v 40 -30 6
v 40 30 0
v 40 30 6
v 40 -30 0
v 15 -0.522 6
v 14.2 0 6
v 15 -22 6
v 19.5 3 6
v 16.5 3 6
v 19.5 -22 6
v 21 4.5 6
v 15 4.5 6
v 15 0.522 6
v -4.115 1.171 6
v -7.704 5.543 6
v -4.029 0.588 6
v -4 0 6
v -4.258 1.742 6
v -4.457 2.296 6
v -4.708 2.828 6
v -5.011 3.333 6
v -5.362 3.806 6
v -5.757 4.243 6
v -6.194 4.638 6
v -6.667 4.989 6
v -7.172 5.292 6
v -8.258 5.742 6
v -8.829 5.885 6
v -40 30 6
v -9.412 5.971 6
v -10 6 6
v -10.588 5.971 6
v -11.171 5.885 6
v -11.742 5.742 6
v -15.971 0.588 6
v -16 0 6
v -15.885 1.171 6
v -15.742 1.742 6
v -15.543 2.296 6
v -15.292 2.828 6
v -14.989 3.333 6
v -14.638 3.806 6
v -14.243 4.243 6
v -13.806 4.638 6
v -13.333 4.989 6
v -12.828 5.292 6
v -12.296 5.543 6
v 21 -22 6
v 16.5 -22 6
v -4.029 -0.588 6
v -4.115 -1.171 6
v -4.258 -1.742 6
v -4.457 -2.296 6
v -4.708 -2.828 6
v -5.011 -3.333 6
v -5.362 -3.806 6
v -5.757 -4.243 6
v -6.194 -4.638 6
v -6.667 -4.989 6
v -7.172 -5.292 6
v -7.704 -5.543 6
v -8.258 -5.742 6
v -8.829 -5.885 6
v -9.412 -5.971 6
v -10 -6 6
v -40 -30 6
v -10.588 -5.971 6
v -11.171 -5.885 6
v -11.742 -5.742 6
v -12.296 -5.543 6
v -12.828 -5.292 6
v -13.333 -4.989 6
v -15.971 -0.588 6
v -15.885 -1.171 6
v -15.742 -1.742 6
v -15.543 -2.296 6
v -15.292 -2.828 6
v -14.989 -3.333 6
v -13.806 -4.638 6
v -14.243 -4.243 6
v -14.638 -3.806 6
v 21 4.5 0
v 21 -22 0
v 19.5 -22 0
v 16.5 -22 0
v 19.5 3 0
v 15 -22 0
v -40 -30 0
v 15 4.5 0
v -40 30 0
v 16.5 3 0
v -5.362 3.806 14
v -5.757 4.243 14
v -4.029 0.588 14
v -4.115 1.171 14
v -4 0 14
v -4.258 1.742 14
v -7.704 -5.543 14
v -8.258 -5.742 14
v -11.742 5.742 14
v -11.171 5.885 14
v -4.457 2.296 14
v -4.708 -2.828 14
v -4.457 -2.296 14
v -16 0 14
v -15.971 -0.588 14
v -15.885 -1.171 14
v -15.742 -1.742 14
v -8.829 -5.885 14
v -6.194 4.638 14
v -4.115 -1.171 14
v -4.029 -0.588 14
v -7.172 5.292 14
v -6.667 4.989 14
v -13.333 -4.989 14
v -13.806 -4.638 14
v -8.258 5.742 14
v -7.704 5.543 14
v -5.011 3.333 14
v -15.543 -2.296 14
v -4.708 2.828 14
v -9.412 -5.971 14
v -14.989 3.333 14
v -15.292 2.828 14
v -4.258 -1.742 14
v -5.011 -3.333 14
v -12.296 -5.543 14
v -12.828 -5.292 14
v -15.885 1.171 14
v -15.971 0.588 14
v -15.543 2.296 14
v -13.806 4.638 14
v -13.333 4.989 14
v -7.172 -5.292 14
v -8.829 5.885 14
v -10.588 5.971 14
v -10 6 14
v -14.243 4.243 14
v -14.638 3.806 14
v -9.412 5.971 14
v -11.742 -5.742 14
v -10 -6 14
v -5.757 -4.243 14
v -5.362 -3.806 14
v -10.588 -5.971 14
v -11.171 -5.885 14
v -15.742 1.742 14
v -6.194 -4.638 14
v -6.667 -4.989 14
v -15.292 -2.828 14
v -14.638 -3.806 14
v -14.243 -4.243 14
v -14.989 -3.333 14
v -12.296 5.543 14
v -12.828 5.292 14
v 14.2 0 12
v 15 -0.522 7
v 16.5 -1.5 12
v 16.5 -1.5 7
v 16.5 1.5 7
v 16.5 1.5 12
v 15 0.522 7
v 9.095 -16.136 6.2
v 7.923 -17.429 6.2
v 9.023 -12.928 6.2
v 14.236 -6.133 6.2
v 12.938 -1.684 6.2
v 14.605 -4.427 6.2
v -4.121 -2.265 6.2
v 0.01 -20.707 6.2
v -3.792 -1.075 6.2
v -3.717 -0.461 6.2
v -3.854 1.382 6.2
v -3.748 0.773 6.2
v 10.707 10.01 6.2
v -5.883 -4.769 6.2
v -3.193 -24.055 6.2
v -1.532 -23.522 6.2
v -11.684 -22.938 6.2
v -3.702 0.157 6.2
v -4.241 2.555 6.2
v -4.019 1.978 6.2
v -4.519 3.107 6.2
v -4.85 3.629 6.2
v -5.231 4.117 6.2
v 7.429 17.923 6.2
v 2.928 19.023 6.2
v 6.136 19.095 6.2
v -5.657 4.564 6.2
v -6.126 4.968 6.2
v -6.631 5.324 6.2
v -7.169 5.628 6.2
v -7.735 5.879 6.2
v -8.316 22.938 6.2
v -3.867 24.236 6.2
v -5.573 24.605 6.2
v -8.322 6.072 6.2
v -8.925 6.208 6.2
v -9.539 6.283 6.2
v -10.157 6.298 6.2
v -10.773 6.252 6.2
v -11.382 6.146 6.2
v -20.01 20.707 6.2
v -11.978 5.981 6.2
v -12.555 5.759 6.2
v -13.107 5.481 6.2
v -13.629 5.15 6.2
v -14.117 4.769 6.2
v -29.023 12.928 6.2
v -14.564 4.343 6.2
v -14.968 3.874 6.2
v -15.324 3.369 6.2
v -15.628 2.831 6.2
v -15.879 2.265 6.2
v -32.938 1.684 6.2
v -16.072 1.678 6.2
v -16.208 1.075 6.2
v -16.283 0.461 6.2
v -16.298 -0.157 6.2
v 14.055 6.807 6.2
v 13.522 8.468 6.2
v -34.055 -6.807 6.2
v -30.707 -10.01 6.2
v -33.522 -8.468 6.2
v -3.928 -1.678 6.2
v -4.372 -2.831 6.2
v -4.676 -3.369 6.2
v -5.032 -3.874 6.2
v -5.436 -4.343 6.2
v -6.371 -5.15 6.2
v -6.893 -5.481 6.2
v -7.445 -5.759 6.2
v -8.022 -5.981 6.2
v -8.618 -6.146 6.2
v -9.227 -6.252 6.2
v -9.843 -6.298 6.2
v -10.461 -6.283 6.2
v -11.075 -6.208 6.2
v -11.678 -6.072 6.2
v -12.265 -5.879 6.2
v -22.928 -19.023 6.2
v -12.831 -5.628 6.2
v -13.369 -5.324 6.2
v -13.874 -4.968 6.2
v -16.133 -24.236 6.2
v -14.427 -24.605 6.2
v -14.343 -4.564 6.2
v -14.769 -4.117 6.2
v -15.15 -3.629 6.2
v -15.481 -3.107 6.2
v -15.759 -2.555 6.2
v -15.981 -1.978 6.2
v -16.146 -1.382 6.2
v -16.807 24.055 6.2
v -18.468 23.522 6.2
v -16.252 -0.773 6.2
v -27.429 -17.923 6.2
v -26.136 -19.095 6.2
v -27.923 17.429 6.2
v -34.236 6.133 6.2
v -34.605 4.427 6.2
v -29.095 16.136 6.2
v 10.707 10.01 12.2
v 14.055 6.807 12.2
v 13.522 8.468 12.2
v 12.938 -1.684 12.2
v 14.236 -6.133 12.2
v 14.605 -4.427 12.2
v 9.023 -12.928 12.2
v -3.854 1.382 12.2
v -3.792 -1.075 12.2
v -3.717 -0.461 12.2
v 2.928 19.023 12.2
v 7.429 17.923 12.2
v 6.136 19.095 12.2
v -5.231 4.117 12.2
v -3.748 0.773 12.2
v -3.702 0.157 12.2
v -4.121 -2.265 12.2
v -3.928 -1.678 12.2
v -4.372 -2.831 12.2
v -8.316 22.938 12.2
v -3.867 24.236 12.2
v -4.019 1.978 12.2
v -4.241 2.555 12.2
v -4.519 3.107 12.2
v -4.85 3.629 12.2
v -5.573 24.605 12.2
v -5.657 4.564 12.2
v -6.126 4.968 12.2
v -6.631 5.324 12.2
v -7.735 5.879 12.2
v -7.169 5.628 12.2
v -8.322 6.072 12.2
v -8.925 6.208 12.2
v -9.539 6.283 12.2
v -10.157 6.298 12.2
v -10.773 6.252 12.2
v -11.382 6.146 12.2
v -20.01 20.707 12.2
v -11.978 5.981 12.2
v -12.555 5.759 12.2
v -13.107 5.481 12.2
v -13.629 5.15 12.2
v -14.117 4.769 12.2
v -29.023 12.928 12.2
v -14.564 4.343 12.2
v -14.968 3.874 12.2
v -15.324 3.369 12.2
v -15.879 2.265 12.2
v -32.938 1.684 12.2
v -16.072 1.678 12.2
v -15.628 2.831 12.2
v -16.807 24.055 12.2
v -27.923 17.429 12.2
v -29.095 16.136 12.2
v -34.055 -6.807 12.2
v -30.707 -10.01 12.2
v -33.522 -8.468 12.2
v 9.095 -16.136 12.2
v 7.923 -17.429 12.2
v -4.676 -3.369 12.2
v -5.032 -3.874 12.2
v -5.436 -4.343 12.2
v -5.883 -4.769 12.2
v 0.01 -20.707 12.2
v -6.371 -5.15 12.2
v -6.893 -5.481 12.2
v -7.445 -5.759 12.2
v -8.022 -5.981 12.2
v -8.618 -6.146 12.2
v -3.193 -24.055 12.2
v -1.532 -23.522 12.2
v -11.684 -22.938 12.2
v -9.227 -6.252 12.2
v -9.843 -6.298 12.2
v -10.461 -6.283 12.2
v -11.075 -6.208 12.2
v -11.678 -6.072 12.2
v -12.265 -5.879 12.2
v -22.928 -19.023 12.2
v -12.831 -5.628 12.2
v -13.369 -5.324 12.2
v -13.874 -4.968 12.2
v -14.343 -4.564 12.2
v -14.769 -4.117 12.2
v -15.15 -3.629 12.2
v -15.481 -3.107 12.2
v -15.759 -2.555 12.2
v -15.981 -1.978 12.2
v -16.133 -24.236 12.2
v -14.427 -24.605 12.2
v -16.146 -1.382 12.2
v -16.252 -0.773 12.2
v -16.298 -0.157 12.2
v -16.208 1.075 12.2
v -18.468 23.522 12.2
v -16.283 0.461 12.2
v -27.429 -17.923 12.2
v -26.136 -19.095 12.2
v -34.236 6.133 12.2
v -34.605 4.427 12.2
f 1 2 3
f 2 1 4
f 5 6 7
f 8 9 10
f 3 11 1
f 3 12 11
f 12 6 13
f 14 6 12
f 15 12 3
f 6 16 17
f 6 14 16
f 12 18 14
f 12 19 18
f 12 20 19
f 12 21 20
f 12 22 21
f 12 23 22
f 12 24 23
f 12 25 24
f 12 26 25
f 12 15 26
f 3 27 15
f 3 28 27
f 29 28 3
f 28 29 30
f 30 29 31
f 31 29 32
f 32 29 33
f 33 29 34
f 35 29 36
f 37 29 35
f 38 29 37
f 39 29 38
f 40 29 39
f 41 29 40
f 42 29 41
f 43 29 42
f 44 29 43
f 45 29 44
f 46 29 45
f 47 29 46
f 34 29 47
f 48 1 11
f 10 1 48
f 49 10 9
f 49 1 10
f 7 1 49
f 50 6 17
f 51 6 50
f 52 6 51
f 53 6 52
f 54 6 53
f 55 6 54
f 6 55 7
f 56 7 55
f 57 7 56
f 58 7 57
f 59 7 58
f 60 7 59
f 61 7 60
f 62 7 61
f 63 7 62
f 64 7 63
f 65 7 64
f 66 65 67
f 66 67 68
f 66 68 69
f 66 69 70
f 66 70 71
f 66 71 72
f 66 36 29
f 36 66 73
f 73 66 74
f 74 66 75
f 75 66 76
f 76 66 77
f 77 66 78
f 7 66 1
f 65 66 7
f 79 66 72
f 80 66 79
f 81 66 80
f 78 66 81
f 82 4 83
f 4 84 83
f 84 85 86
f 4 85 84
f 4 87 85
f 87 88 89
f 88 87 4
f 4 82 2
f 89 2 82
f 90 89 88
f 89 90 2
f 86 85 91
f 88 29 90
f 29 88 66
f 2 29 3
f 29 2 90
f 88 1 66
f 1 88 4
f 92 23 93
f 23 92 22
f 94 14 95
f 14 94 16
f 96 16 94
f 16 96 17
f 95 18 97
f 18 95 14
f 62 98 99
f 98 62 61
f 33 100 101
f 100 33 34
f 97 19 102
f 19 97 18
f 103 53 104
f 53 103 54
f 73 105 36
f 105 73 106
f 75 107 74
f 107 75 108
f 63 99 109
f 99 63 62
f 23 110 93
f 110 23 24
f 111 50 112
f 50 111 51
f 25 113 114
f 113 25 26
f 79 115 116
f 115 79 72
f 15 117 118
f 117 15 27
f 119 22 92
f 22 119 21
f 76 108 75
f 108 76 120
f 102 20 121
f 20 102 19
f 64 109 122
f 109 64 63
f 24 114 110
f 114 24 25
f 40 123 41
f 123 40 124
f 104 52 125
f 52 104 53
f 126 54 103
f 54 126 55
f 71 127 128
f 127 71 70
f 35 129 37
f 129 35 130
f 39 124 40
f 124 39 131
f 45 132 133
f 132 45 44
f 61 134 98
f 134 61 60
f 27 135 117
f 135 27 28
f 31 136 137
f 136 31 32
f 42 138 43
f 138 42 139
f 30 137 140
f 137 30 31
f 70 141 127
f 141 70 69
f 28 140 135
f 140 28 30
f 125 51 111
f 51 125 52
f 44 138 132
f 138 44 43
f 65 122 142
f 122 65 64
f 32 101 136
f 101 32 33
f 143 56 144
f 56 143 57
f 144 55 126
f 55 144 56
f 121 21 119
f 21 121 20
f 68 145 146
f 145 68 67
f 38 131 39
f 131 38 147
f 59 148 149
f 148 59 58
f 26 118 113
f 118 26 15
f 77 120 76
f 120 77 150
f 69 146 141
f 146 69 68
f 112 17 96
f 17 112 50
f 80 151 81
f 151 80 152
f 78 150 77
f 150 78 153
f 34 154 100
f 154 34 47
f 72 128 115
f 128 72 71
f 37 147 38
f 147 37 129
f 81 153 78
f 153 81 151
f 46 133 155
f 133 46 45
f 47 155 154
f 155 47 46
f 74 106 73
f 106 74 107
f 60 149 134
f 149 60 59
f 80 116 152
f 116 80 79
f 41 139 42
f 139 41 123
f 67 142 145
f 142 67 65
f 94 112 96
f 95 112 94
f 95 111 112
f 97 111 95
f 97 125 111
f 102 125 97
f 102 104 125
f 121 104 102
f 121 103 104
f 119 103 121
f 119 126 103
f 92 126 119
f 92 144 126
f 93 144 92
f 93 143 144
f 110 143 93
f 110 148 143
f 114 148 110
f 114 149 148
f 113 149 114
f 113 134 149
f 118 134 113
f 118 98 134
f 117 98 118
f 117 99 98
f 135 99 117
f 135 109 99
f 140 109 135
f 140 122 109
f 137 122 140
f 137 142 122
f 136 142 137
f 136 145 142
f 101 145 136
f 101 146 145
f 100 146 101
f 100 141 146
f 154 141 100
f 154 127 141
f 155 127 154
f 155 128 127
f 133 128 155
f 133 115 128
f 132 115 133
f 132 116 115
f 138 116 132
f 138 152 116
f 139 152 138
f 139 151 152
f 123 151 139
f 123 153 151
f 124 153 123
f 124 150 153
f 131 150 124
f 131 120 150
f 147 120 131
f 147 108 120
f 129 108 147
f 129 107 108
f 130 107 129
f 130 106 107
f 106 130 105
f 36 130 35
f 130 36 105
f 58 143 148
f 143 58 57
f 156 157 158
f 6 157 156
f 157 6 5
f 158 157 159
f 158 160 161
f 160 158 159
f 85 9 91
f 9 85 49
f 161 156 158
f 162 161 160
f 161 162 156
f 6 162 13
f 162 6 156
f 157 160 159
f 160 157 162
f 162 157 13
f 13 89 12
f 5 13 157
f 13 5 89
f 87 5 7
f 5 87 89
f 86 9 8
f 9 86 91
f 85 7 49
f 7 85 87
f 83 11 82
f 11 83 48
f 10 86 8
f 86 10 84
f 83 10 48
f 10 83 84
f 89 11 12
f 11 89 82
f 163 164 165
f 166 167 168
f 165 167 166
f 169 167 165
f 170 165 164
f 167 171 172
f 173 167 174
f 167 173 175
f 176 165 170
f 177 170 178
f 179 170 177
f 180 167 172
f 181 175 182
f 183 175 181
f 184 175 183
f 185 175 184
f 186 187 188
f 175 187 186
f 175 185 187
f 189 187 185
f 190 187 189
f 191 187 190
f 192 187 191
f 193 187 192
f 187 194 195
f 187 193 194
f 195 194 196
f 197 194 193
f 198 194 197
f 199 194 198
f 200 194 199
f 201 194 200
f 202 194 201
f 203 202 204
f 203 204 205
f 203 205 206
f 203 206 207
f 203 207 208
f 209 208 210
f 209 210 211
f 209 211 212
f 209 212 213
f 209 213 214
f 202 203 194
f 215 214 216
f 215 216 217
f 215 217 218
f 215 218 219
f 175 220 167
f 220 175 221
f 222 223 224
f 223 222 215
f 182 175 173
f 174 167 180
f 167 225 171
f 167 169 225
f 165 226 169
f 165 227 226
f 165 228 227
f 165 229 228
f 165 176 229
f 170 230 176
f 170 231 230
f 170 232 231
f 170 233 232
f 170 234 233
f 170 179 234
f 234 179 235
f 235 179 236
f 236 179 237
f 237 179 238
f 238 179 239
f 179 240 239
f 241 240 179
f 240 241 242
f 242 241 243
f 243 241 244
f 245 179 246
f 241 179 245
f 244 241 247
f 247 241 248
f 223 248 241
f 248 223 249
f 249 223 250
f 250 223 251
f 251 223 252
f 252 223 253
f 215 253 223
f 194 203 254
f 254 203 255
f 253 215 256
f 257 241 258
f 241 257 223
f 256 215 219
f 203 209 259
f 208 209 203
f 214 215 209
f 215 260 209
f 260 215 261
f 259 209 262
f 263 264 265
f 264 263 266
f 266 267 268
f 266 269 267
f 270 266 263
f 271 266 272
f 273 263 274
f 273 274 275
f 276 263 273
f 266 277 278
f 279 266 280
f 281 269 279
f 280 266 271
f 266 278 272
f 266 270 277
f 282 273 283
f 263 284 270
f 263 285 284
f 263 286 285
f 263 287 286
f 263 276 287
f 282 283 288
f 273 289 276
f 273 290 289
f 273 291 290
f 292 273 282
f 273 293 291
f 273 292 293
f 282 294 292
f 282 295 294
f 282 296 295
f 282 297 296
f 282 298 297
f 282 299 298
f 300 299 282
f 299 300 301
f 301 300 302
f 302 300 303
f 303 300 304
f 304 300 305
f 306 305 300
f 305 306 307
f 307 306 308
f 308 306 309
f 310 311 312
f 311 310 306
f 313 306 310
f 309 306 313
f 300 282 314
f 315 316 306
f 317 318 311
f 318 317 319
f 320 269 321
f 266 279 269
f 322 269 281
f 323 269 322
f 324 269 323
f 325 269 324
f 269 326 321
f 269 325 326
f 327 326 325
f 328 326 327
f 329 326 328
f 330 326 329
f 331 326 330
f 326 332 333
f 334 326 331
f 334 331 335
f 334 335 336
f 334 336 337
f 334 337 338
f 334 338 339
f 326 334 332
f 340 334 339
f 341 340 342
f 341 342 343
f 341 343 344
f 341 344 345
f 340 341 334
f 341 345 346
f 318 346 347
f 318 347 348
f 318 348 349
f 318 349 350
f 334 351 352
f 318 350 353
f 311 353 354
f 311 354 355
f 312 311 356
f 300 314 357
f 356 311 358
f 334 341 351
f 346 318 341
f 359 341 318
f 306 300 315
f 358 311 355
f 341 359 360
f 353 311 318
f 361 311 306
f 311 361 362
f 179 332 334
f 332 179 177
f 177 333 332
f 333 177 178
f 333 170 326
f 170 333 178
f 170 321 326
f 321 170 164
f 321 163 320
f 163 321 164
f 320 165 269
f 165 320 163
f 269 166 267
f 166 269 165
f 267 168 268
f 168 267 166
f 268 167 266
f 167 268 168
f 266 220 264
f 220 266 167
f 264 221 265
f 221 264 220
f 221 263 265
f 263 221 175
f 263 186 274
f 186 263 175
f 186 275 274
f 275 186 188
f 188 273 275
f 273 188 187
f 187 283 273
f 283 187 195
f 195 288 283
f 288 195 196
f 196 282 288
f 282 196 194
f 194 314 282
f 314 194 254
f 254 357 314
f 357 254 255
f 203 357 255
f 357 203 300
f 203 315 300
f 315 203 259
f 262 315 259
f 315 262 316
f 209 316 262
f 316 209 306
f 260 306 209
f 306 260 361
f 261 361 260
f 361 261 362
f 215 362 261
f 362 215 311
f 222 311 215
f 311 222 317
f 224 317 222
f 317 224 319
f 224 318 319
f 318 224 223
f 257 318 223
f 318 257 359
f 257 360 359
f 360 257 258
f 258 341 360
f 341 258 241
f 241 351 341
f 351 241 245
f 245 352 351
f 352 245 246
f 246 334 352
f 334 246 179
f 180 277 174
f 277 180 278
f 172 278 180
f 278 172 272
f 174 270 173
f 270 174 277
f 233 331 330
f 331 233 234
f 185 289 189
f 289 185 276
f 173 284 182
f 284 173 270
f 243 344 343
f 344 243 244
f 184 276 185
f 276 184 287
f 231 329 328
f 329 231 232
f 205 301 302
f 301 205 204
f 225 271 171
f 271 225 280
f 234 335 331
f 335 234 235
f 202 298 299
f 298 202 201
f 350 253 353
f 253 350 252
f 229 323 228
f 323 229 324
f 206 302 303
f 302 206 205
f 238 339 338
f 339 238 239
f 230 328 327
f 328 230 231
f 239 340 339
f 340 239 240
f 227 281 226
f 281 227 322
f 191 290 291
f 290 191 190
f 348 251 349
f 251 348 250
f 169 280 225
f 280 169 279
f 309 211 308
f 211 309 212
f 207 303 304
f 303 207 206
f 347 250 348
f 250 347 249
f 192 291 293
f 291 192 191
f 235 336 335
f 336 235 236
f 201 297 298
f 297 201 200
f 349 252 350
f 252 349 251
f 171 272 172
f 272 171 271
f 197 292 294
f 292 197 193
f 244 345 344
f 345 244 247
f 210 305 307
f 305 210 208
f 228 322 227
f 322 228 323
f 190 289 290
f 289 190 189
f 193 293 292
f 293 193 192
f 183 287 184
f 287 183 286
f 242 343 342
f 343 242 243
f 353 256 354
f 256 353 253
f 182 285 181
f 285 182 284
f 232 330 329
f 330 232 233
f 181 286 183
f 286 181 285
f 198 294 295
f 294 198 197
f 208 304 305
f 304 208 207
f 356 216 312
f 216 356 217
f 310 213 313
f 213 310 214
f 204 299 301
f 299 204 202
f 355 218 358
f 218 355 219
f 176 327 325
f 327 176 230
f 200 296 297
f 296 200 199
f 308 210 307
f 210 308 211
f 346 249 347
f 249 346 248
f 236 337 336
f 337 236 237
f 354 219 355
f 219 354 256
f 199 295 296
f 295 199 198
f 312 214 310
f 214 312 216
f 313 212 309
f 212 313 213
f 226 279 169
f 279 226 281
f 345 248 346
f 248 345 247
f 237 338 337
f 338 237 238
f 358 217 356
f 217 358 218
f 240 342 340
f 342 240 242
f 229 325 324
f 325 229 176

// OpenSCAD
/* Ratchet wheel with spring pawl - desk demo, PLA, no supports */
part = "assembly"; // [wheel:Wheel, base:Base, assembly:Assembly]

cadverify_only = "";
module instance(name, part, unit = 1) {
    echo(cadverify_instance = [name, part, unit]);
    if (cadverify_only == "" || cadverify_only == name) children();
}

// ---------- parameters (mm) ----------
Rtip = 25;          // wheel outer radius (50mm across)
Rroot = 23;         // wheel root radius (tooth height 2mm)
wheel_t = 6;        // wheel thickness
hole_D = 12.6;      // wheel centre hole
post_D = 12;        // base post diameter
post_h = 8;         // post height above base top
base_t = 6;         // base plate thickness
base_x = 80;
base_y = 60;
wheel_cx = -10;     // wheel centre in base/assembly XY
wheel_cy = 0;
wheel_gap = 0.2;    // wheel bottom above base top
pawl_rad = 24.2;    // pawl tip radius from wheel centre (0.8 inside tip circle)
pawl_tip_x = wheel_cx + pawl_rad; // 14.2
pawl_tip_y = 0;
beam_x0 = 16.5; beam_x1 = 19.5;   // flexible arm (3mm wide)
beam_y0 = -22; beam_y1 = 3;       // arm length ~25mm
slot_w = 1.5;
wheel_lift_z = base_t + wheel_gap; // 6.2 wheel bottom in assembly
post_top_z = base_t + post_h;      // 14
pawl_h = 6;                        // pawl height 6..12

// tooth angles: shallow root->tip 20deg, tip 4deg, steep tip->root 6deg
function wheel_pts() = [
    for(k=[0:11]) for(j=[0:2])
        j==0 ? [Rroot*cos(k*30), Rroot*sin(k*30)]
      : j==1 ? [Rtip*cos(k*30+20), Rtip*sin(k*30+20)]
             : [Rtip*cos(k*30+24), Rtip*sin(k*30+24)]
];

module wheel() {
    difference() {
        linear_extrude(height=wheel_t, convexity=4)
            polygon(points=wheel_pts());
        translate([0,0,-1]) cylinder(d=hole_D, h=wheel_t+2, $fn=64);
    }
}

module base() {
    difference() {
        union() {
            // plate
            translate([-base_x/2, -base_y/2, 0]) cube([base_x, base_y, base_t]);
            // post
            translate([wheel_cx, wheel_cy, base_t]) cylinder(d=post_D, h=post_h, $fn=64);
            // pawl tooth on top of arm free end (triangle prism)
            linear_extrude(height=pawl_h, convexity=2)
                polygon(points=[[pawl_tip_x, pawl_tip_y],[beam_x0, 1.5],[beam_x0, -1.5]]);
            // note: arm beam itself is the plate material between slots (0..base_t),
            // pawl sits with its base at z=base_t
            translate([0,0,base_t]) linear_extrude(height=0.01) square([0.01,0.01]); // keep union non-empty
        }
        // U-slot freeing the arm (through plate)
        // west slot
        translate([beam_x0-slot_w, beam_y0, -1]) cube([slot_w, beam_y1-beam_y0, base_t+2]);
        // east slot
        translate([beam_x1, beam_y0, -1]) cube([slot_w, beam_y1-beam_y0, base_t+2]);
        // north slot (connects west+east, frees north end)
        translate([beam_x0-slot_w, beam_y1, -1]) cube([(beam_x1+slot_w)-(beam_x0-slot_w), slot_w, base_t+2]);
    }
    // pawl tooth base is at z=base_t: move it up (it was built at 0..pawl_h in union above? fix)
}

// fix: rebuild base correctly with pawl at right z
module base_correct() {
    difference() {
        union() {
            translate([-base_x/2, -base_y/2, 0]) cube([base_x, base_y, base_t]);
            translate([wheel_cx, wheel_cy, base_t]) cylinder(d=post_D, h=post_h, $fn=64);
            translate([0,0,base_t]) linear_extrude(height=pawl_h, convexity=2)
                polygon(points=[[pawl_tip_x, pawl_tip_y],[beam_x0, 1.5],[beam_x0, -1.5]]);
        }
        translate([beam_x0-slot_w, beam_y0, -1]) cube([slot_w, beam_y1-beam_y0, base_t+2]);
        translate([beam_x1, beam_y0, -1]) cube([slot_w, beam_y1-beam_y0, base_t+2]);
        translate([beam_x0-slot_w, beam_y1, -1]) cube([(beam_x1+slot_w)-(beam_x0-slot_w), slot_w, base_t+2]);
    }
}

module assembly() {
    instance("base_inst", "base", 1) base_correct();
    // wheel rotated -4.2deg so gullet centre aligns with pawl tip (east)
    instance("wheel_inst", "wheel", 1)
        translate([wheel_cx, wheel_cy, wheel_lift_z]) rotate([0,0,-4.2]) wheel();
}

// ---------- specs (computed from parameters) ----------
wheel_spec = [
    ["bounds", [[-Rtip, -Rtip, 0], [Rtip, Rtip, wheel_t]]],
    ["bodies", 1],
    ["through_holes", 1],
    ["support_faces", [["bed", "-z", 800]]],
    ["overhangs_allowed", []],
    ["copies", 1],
    ["details", [
        ["axle_hole", "hole", [0, 0, wheel_t+4], [0, 0, -1], [[0, hole_D], [wheel_t, hole_D]]],
        ["rim_thick", "thickness", [15, 0, wheel_t+4], [0, 0, -1], wheel_t],
        ["tooth0", "material", [[22.5, 8.0, 0], [24.0, 10.0, wheel_t]], 0.5],
        ["tooth1", "material", [[-2.0, 23.0, 0], [2.0, 25.0, wheel_t]], 0.3],
        ["tooth2", "material", [[-24.0, 8.0, 0], [-22.0, 10.5, wheel_t]], 0.3]
    ]]
];

base_spec = [
    ["bounds", [[-base_x/2, -base_y/2, 0], [base_x/2, base_y/2, post_top_z]]],
    ["bodies", 1],
    ["through_holes", 1],
    ["support_faces", [["bed", "-z", 2000]]],
    ["overhangs_allowed", [["pawl bridges slot", [[13.5, -2, 5.8], [17.5, 2, 6.2]]]]],
    ["copies", 1],
    ["details", [
        ["plate_thick", "thickness", [0, -28, base_t+4], [0, 0, -1], base_t],
        ["post_dia", "thickness", [wheel_cx-10, wheel_cy, base_t+4], [1, 0, 0], post_D],
        ["post_height", "thickness", [wheel_cx, wheel_cy, post_top_z+4], [0, 0, -1], post_top_z],
        ["arm_width", "thickness", [beam_x0-0.8, -10, 3], [1, 0, 0], beam_x1-beam_x0],
        ["slot_gap", "void", [[beam_x0-slot_w, -20, 0], [beam_x0, -10, base_t]], 0.8],
        ["pawl_tip", "material", [[15, -0.5, base_t+1], [16, 0.5, base_t+5]], 0.8],
        ["pawl_height", "thickness", [15.5, 0, base_t+pawl_h+3], [0, 0, -1], pawl_h]
    ]]
];

assembly_spec = [
    ["bounds", [[-base_x/2, -base_y/2, 0], [base_x/2, base_y/2, post_top_z]]],
    ["support_faces", [["desk", "-z", 2000]]],
    ["allowed_interferences", []],
    ["motions", [
        ["spin_free", ["wheel_inst"], "rotate", [wheel_cx, wheel_cy, wheel_lift_z], [0, 0, 1], [0, -360],
            ["flex", [["wheel_inst", "base_inst", 0.9, "pawl clicks over teeth"]]]]
    ]],
    ["assembly_order", [
        [["base_inst"], [0, 0, 0]],
        [["wheel_inst"], [0, 0, -1]]
    ]]
];

if (part == "wheel") {
    echo(cadverify_spec = wheel_spec);
    wheel();
} else if (part == "base") {
    echo(cadverify_spec = base_spec);
    base_correct();
} else {
    echo(cadverify_spec = assembly_spec);
    assembly();
}
